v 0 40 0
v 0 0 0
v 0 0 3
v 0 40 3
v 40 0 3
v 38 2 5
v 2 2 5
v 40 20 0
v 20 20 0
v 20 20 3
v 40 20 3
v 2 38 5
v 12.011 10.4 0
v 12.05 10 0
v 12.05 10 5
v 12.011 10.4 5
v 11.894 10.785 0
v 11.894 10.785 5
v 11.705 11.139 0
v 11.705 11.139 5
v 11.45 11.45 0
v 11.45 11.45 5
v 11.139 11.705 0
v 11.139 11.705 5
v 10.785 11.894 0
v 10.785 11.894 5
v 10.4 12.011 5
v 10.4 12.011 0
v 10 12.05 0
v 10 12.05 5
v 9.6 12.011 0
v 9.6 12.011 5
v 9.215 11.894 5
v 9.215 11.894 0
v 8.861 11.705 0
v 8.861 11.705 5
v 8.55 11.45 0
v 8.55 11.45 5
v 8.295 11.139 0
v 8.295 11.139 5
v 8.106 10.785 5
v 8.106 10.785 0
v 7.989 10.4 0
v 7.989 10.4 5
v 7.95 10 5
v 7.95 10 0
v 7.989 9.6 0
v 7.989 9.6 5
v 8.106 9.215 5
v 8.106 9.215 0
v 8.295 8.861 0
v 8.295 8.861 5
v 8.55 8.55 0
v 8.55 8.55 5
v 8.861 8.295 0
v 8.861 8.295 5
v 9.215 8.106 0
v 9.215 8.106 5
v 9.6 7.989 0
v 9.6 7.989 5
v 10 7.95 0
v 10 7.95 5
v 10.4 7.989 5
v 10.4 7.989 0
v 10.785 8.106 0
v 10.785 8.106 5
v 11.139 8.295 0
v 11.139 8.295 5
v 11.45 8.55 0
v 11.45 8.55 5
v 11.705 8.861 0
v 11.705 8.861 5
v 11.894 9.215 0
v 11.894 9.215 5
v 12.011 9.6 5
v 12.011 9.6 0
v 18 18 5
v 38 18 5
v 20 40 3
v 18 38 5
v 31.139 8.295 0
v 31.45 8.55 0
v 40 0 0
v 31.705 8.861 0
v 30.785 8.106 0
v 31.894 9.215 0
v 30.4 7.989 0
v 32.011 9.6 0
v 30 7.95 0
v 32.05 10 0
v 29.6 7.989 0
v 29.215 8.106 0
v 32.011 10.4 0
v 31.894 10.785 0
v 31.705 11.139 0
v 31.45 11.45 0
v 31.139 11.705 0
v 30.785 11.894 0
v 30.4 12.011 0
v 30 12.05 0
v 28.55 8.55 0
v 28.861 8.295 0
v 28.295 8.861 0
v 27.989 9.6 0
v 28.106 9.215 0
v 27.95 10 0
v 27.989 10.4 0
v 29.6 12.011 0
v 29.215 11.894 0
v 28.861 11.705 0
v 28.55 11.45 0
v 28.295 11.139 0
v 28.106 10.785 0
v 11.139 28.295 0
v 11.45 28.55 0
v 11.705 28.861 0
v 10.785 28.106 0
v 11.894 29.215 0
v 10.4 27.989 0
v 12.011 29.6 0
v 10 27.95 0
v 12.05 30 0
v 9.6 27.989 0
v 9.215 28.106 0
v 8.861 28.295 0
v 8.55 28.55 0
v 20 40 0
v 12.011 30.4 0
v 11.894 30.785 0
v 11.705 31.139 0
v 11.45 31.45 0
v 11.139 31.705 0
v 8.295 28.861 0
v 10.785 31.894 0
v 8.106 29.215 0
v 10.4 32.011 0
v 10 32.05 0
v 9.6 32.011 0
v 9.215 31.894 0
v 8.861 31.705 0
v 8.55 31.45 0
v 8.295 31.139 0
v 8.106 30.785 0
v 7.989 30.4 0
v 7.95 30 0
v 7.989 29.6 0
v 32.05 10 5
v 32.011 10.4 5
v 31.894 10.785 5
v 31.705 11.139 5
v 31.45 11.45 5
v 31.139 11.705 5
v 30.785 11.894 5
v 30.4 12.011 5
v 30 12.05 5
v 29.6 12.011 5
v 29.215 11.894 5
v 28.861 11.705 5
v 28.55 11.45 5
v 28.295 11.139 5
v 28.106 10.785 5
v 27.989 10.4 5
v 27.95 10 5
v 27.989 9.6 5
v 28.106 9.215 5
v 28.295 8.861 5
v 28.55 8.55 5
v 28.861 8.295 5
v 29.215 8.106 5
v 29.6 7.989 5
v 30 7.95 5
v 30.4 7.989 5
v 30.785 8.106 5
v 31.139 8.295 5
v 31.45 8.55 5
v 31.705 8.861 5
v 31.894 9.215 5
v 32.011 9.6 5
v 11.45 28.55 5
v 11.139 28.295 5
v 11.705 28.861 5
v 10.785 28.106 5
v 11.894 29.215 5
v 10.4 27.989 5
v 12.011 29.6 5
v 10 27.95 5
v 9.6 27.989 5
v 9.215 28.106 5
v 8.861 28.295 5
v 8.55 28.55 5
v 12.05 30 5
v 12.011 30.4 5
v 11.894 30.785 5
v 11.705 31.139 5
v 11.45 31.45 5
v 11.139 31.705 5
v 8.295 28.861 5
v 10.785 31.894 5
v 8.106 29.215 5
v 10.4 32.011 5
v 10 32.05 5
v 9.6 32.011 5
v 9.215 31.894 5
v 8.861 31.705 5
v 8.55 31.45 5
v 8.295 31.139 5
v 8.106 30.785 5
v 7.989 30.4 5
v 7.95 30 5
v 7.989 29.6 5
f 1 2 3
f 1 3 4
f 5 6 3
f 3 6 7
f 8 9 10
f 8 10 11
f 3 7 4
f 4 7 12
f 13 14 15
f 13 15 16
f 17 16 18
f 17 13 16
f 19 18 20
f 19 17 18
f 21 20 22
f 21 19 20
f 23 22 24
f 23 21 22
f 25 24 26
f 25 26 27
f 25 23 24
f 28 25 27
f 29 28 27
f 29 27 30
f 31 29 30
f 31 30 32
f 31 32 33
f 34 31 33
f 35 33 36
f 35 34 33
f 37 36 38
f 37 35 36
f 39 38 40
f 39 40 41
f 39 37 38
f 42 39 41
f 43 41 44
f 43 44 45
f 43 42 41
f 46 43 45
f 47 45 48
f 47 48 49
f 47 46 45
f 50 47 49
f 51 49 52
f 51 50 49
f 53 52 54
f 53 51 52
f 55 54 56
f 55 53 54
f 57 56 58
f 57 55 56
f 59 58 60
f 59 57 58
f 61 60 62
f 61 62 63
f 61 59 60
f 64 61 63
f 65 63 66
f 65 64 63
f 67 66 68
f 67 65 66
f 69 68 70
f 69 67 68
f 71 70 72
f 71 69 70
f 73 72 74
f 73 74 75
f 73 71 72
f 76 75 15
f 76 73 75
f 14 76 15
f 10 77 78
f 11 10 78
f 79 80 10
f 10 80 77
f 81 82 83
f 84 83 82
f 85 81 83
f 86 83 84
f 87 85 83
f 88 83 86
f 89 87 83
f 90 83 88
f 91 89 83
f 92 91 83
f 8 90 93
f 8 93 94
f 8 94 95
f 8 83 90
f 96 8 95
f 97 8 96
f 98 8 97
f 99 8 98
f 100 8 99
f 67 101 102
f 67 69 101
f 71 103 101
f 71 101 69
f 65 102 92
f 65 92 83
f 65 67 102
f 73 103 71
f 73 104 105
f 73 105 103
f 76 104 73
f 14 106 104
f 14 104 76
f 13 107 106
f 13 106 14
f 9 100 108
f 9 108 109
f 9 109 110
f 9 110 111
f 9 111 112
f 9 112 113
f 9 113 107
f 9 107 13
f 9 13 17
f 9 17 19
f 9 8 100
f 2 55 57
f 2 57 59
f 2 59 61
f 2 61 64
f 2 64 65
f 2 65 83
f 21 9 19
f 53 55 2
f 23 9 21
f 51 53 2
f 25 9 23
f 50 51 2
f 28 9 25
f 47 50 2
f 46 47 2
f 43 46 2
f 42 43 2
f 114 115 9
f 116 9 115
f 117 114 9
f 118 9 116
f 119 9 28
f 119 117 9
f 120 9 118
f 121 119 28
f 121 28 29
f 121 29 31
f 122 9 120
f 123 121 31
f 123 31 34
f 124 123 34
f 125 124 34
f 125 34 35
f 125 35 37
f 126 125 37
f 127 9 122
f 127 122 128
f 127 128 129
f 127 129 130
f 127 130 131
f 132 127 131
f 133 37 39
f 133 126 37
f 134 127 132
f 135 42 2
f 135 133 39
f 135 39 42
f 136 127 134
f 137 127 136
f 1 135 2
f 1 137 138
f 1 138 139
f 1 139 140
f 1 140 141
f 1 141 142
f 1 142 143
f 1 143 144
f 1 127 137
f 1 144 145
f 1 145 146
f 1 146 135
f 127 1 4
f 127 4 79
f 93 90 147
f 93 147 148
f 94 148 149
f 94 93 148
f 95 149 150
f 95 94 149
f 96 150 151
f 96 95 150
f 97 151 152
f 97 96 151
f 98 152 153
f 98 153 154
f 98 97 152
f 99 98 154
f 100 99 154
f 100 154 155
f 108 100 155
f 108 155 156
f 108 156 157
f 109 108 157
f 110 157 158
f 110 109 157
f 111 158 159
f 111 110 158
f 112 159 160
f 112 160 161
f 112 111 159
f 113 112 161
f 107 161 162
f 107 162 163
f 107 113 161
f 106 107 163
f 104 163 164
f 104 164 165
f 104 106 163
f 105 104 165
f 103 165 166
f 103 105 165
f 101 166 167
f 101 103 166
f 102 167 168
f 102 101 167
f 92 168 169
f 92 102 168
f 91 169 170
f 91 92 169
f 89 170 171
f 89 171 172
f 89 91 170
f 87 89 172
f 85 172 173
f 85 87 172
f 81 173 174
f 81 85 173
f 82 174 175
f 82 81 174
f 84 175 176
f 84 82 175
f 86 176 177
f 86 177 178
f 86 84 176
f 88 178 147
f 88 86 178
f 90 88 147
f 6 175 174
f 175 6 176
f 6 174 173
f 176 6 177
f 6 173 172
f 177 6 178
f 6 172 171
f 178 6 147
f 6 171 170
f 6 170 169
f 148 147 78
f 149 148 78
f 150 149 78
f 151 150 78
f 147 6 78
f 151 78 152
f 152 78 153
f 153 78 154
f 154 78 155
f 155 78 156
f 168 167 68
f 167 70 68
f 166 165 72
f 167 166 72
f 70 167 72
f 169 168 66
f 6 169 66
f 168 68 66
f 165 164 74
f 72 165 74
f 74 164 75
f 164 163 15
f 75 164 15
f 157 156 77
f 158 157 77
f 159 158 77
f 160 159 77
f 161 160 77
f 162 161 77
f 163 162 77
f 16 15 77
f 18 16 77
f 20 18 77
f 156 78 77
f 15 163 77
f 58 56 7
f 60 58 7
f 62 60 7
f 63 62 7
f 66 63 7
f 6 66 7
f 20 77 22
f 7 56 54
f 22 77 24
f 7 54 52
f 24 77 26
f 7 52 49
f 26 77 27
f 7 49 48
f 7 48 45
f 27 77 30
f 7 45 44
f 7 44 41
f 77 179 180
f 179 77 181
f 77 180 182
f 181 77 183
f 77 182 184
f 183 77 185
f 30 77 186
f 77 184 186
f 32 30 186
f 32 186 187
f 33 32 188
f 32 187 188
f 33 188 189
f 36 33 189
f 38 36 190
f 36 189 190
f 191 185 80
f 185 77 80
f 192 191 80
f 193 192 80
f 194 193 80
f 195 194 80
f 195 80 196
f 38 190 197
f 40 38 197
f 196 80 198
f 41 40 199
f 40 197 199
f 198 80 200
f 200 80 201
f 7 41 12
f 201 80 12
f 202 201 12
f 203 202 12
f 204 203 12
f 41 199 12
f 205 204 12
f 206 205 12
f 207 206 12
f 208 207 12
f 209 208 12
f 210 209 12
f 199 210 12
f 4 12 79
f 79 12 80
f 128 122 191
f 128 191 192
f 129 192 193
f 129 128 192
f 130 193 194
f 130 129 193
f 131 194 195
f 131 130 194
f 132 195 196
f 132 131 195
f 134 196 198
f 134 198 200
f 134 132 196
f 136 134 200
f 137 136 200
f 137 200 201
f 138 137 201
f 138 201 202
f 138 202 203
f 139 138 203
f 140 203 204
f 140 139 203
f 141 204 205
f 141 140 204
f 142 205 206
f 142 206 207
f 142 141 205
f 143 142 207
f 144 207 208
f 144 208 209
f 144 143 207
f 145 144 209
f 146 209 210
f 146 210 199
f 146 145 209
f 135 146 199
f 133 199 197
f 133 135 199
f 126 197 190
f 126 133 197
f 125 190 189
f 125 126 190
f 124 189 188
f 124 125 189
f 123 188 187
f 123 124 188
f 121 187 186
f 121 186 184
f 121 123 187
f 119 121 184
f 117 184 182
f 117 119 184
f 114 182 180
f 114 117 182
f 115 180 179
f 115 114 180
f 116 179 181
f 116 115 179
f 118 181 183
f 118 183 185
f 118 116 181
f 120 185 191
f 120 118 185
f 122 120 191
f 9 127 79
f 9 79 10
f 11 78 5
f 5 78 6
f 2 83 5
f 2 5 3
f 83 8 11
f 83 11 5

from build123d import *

# Parameters (mm, degrees)
SKETCH_R      = 2.05
EXTRUDE_DEPTH = 5
CHAMFER_SIZE  = 2


with BuildPart() as part:
    # Sketch → Extrude (new body)
    with BuildSketch(Plane.XY):
        Polygon((0, 0), (0, 40), (20, 40), (20, 20), (40, 20), (40, 0), align=None)
        with Locations((10, 10)):
            Circle(SKETCH_R, mode=Mode.SUBTRACT)
        with Locations((30, 10)):
            Circle(SKETCH_R, mode=Mode.SUBTRACT)
        with Locations((10, 30)):
            Circle(SKETCH_R, mode=Mode.SUBTRACT)
    extrude(amount=EXTRUDE_DEPTH)

    # Chamfer
    chamfer_edges = [part.edges().sort_by_distance(p)[0] for p in [
        (0, 20, 5),
        (10, 40, 5),
        (20, 30, 5),
        (30, 20, 5),
        (40, 10, 5),
        (20, 0, 5),
    ]]
    chamfer(chamfer_edges, length=CHAMFER_SIZE)


solid = part.part
